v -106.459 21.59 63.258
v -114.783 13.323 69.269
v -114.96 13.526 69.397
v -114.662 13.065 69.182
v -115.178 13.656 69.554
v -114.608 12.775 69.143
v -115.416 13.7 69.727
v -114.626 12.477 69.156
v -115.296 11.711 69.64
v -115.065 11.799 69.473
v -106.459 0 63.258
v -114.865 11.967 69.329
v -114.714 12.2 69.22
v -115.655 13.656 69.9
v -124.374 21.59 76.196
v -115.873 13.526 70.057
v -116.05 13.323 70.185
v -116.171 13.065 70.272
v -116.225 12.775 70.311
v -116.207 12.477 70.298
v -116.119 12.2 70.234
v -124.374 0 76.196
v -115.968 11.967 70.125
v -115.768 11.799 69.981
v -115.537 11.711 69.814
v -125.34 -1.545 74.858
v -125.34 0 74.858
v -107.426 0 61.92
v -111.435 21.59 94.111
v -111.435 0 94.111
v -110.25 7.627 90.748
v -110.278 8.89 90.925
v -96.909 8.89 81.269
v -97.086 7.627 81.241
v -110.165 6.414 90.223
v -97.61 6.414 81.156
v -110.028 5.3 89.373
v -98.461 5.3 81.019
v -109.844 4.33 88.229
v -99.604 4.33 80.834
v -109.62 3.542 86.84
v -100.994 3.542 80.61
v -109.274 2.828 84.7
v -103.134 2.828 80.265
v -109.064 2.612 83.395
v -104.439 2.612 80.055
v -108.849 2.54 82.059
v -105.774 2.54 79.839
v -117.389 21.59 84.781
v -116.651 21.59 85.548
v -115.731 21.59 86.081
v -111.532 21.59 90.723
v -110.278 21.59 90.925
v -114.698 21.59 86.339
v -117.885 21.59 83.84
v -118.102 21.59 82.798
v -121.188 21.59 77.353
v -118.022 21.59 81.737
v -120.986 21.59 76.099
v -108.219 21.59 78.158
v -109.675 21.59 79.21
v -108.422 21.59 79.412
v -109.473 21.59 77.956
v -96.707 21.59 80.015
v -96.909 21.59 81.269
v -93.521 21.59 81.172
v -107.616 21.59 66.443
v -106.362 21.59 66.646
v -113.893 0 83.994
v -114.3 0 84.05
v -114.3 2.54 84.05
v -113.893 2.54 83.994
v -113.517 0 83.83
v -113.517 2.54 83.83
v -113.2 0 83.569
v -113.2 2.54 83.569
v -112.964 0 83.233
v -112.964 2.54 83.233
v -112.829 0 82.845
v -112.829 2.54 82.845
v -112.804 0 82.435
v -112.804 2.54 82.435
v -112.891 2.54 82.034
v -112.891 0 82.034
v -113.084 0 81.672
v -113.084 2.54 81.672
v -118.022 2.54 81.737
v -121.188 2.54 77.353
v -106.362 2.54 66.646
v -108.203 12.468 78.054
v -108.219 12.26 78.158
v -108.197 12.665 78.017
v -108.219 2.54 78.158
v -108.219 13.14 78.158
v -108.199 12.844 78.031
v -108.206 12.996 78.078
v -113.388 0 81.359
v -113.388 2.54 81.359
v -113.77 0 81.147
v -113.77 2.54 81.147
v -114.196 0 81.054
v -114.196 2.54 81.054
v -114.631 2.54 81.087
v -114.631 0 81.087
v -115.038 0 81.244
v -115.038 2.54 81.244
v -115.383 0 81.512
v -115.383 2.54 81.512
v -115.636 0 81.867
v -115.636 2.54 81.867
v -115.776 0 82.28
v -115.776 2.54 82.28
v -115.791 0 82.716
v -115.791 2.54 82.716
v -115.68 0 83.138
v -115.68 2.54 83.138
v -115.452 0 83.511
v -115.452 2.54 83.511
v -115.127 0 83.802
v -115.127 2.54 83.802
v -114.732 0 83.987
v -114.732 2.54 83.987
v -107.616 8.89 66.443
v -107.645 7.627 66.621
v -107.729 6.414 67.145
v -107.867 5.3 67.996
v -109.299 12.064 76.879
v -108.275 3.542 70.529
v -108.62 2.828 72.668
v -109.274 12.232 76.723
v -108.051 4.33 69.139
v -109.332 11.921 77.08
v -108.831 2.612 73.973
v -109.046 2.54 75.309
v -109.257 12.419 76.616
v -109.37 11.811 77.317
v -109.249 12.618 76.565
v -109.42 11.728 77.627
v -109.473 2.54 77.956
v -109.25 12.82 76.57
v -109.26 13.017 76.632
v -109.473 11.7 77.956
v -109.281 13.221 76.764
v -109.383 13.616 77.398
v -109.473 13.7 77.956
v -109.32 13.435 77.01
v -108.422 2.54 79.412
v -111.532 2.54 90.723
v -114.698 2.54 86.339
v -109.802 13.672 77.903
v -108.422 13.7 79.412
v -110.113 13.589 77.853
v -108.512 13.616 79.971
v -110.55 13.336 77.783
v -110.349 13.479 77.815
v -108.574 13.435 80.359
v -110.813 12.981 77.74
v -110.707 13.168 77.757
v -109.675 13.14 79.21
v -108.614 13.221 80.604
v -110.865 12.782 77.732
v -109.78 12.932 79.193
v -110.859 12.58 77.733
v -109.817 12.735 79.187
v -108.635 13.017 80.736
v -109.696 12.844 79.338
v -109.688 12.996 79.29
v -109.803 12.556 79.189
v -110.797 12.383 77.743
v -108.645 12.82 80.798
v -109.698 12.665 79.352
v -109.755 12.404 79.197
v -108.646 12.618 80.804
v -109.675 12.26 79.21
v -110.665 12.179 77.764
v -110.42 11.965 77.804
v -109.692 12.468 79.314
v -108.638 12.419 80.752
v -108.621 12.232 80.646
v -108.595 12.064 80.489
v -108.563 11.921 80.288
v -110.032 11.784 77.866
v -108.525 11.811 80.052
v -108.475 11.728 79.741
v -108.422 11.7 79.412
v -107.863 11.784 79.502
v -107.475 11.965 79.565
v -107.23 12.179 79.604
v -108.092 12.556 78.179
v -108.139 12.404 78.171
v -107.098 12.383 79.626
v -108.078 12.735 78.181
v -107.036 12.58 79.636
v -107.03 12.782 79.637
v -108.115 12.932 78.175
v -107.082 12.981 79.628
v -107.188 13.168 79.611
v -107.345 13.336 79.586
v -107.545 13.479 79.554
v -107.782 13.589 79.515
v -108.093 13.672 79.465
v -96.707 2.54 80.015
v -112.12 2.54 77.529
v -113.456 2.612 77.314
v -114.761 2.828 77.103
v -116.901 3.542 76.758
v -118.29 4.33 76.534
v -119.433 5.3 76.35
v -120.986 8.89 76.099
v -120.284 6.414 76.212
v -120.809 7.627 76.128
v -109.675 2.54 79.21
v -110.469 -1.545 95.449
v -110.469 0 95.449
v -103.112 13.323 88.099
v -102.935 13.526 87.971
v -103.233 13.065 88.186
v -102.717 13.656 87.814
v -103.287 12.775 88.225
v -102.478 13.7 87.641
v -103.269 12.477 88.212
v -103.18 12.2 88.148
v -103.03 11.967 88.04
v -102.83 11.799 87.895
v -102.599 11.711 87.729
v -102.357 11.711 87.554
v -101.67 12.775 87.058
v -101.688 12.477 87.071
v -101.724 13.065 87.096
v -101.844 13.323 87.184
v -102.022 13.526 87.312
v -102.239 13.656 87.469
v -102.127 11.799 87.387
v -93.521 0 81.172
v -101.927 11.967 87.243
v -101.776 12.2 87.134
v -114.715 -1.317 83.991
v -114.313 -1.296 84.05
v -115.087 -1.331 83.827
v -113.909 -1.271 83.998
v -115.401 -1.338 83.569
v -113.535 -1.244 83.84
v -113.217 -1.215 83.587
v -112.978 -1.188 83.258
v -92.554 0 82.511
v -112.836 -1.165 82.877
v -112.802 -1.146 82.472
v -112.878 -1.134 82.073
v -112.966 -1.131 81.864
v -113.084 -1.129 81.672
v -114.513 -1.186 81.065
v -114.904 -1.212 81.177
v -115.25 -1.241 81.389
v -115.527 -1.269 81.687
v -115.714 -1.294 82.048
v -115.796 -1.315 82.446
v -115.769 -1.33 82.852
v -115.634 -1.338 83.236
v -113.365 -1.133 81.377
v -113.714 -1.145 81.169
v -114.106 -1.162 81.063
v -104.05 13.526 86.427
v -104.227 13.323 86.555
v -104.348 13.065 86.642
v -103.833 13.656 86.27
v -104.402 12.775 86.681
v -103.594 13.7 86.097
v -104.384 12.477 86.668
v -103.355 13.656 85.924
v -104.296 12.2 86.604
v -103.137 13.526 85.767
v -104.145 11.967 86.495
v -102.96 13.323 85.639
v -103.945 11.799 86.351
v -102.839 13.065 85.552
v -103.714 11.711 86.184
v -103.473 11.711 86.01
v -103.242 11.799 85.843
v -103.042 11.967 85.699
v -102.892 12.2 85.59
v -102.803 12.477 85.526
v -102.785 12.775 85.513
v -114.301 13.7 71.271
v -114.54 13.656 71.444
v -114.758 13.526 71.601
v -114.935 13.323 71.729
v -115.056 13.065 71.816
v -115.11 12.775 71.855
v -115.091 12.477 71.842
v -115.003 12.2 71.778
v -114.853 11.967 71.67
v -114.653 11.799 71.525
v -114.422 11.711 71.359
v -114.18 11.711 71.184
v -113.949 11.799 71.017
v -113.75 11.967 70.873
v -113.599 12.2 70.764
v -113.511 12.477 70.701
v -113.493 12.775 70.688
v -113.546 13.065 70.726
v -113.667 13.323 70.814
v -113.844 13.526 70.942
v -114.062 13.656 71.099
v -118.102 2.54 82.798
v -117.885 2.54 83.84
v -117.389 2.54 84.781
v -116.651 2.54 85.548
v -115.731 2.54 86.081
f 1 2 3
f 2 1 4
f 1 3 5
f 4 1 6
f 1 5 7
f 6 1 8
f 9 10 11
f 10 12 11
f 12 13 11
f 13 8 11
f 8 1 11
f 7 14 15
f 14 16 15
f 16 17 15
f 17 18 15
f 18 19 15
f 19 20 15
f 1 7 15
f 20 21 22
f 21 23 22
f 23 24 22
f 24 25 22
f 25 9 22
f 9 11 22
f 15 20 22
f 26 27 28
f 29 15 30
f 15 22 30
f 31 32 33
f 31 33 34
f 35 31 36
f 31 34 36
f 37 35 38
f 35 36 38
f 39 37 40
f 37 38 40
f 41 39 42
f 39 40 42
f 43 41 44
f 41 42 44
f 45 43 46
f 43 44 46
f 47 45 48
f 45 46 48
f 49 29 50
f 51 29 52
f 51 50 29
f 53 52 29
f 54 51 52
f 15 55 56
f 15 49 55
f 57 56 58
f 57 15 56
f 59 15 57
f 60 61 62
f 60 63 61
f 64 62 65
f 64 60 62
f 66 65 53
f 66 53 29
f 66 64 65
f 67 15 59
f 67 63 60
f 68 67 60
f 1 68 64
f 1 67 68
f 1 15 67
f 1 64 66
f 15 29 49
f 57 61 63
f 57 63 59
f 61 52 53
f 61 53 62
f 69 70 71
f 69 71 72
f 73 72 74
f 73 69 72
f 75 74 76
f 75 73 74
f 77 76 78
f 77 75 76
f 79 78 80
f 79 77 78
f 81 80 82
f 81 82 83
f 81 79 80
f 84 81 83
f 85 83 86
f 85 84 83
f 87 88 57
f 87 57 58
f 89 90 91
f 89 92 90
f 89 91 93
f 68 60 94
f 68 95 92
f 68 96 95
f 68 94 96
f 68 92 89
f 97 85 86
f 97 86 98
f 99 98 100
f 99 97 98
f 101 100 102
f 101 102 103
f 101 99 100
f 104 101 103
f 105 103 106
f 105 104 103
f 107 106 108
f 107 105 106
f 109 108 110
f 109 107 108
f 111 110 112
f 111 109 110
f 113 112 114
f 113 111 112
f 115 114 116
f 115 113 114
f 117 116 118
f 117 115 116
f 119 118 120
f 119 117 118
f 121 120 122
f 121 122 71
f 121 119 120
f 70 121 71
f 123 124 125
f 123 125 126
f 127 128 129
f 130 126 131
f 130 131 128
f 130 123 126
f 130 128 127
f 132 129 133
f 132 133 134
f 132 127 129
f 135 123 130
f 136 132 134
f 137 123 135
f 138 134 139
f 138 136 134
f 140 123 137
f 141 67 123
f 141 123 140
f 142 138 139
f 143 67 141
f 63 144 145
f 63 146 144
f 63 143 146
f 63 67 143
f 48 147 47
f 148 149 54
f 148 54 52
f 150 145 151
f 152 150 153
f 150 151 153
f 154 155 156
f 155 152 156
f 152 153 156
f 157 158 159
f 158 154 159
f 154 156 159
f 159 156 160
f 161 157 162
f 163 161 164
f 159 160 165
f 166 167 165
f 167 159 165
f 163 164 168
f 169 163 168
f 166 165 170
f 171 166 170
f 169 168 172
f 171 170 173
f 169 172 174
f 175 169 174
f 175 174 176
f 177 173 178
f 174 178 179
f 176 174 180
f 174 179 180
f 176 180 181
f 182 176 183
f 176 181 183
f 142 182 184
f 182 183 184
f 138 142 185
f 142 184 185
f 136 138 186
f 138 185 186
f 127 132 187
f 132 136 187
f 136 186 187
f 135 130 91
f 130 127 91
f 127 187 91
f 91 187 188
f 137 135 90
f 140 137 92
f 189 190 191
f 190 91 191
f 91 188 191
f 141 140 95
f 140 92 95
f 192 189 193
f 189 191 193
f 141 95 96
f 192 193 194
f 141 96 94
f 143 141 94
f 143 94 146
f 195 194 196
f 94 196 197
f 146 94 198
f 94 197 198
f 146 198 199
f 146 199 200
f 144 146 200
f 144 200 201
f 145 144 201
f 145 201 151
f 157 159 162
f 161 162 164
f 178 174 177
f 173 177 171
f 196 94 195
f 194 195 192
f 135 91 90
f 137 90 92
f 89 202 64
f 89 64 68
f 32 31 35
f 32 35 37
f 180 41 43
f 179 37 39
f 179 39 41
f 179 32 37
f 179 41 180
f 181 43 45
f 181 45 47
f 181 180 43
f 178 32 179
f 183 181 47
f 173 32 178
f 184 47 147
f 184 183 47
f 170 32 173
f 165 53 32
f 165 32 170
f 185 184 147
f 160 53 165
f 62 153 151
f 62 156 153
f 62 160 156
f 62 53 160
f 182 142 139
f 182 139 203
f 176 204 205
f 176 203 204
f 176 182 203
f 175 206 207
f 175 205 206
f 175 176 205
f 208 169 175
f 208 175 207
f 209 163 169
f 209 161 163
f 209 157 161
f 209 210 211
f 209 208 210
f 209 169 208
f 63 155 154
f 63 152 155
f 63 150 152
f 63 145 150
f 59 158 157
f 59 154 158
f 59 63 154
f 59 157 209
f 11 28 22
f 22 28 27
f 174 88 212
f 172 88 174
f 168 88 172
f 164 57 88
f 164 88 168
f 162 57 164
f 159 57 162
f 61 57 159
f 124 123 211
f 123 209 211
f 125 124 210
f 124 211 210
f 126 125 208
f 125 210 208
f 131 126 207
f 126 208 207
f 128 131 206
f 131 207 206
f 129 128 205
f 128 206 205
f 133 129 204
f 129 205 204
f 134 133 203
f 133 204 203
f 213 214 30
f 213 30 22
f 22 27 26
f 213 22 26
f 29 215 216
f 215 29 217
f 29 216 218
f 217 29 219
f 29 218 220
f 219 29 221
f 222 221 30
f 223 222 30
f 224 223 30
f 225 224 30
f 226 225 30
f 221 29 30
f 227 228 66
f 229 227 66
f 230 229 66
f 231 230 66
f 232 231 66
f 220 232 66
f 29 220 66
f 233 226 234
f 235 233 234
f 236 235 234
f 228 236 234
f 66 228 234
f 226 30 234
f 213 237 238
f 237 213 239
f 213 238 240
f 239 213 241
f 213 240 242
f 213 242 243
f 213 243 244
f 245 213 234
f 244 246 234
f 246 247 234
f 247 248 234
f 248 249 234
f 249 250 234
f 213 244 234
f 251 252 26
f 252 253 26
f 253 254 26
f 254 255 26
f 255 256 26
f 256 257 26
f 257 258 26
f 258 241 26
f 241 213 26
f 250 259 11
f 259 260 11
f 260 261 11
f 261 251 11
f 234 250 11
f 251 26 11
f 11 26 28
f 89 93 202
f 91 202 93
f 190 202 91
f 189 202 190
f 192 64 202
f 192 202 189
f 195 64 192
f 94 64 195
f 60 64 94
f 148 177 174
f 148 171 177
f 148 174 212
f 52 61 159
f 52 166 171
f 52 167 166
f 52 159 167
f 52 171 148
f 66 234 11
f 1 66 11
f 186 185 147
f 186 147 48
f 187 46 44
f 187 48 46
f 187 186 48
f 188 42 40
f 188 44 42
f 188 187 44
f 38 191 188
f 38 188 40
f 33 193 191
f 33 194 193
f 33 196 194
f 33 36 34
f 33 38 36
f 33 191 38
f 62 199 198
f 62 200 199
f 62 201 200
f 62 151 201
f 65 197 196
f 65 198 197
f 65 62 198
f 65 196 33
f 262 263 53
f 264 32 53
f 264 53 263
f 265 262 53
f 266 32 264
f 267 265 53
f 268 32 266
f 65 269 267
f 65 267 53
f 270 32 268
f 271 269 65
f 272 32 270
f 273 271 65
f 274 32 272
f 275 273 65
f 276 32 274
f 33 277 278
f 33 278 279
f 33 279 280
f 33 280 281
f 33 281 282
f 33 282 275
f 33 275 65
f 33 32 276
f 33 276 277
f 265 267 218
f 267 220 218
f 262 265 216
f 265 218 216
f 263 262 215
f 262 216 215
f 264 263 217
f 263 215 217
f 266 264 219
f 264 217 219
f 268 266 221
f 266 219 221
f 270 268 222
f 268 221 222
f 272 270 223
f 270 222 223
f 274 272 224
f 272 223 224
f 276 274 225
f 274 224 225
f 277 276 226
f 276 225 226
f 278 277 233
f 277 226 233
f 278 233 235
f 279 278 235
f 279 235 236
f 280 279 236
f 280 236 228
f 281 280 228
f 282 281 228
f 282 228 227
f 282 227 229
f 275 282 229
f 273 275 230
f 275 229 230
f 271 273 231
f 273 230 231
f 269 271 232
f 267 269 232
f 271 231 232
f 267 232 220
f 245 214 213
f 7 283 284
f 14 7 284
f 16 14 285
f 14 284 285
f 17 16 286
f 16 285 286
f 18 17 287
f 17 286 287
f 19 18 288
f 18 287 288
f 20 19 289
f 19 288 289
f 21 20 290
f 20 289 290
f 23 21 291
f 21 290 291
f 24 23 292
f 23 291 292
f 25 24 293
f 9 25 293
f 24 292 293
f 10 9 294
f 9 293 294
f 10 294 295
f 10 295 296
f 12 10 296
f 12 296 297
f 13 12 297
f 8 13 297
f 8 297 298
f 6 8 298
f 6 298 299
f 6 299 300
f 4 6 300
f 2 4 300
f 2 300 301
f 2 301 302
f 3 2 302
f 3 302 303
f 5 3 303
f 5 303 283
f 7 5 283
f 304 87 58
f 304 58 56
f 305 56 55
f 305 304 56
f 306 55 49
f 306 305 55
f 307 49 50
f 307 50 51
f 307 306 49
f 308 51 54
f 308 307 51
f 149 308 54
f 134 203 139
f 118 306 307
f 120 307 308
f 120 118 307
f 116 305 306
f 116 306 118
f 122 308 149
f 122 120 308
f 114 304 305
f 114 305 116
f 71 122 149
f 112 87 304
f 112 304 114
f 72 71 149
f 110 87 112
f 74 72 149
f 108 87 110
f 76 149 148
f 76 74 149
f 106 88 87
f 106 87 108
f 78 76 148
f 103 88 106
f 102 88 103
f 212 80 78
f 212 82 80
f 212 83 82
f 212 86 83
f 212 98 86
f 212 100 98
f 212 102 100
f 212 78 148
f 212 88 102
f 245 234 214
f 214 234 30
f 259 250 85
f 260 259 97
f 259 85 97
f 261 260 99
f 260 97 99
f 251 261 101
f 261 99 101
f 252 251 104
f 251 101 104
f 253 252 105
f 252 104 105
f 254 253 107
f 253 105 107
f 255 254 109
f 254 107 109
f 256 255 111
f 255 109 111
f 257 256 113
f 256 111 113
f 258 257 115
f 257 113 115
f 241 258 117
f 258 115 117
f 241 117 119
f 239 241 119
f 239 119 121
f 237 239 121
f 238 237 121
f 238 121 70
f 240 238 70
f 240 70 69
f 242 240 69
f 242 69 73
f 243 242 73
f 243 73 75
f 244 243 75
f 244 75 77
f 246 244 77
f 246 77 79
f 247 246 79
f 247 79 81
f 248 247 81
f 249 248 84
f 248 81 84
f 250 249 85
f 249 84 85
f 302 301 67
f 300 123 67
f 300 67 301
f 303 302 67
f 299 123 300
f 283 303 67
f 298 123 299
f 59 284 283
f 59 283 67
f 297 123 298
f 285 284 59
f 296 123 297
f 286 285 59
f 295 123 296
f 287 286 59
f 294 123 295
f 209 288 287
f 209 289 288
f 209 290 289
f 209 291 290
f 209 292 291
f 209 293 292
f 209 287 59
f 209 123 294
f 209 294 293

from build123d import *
from build123d.topology import SkipClean

# Parameters (mm, degrees)
SKETCH1_R           = 1.5
BOSS_EXTRUDE2_DEPTH = 2.54
BOSS_EXTRUDE3_DEPTH = 19.05
BOSS_EXTRUDE6_DEPTH = 19.05
SKETCH4_R           = 1
CUT_EXTRUDE1_DEPTH  = 158.597711186
FILLET1_R           = 6.35
BOSS_EXTRUDE7_DEPTH = 12.7
SKETCH6_R           = 1.5
CUT_EXTRUDE2_DEPTH  = 159.693396714


with BuildPart() as part:
    # Sketch1 → Boss-Extrude2 (new body)
    with BuildSketch(Plane(origin=(0, 0, 0), x_dir=(1, 0, 0), z_dir=(0, 1, 0))):
        Polygon((-93.521103592, -81.172331094), (-106.459273851, -63.257941504), (-124.37366344, -76.196111763), (-111.435493182, -94.110501353), align=None)
        with Locations(Location((-114.3, -82.55, 0), (0, 0, 270))):
            Circle(SKETCH1_R, mode=Mode.SUBTRACT)
    extrude(amount=BOSS_EXTRUDE2_DEPTH)

    # Sketch2 → Boss-Extrude3 (add)
    with BuildSketch(Plane(origin=(0, 2.54, 0), x_dir=(1, 0, 0), z_dir=(0, 1, 0))):
        Polygon((-106.459273851, -63.257941504), (-124.37366344, -76.196111763), (-111.435493182, -94.110501353), (-93.521103592, -81.172331094), align=None)
        with BuildLine():
            Line((-106.888258276, -65.91764494), (-121.713960005, -76.625096188))
            Line((-121.713960005, -76.625096188), (-118.022197338, -81.736767574))
            ThreePointArc((-118.022197338, -81.736767574), (-117.38868786, -84.78071901), (-114.698271424, -86.339126532))
            Line((-114.698271424, -86.339126532), (-111.006508757, -91.450797917))
            Line((-111.006508757, -91.450797917), (-96.180807028, -80.743346669))
            Line((-96.180807028, -80.743346669), (-106.888258276, -65.91764494))
        make_face(mode=Mode.SUBTRACT)
    extrude(amount=BOSS_EXTRUDE3_DEPTH)

    # Sketch3 → Boss-Extrude6 (add)
    with BuildSketch(Plane(origin=(0, 21.59, 0), x_dir=(1, 0, 0), z_dir=(0, 1, 0))):
        Polygon((-121.713960005, -76.625096188), (-121.188174492, -77.353106899), (-109.675394227, -79.210006941), (-111.53229427, -90.722787207), (-111.006508757, -91.450797917), (-110.278498046, -90.925012404), (-108.421598003, -79.412232139), (-96.908817738, -81.269132182), (-96.180807028, -80.743346669), (-96.706592541, -80.015335958), (-108.219372806, -78.158435915), (-106.362472763, -66.64565565), (-106.888258276, -65.91764494), (-107.616268987, -66.443430453), (-109.473169029, -77.956210718), (-120.985949295, -76.099310675), align=None)
    extrude(amount=-BOSS_EXTRUDE6_DEPTH)

    # Sketch4 → Cut-Extrude1 (cut, through all)
    with BuildSketch(Plane(origin=(6.469085129, 0, 8.957194795), x_dir=(0.8106792283998809, 0, -0.5854905538443587), z_dir=(0.5854905538443586, 0, 0.8106792283998808))):
        with Locations(Location((-134.390249188, 12.7, 0), (0, 0, 90))):
            Circle(SKETCH4_R)
    extrude(amount=-CUT_EXTRUDE1_DEPTH, mode=Mode.SUBTRACT)

    # Fillet1
    fillet1_edges = [part.edges().sort_by_distance(p)[0] for p in [
        (-103.593657892, 2.54, 86.097072293),
        (-114.301109141, 2.54, 71.271370564),
    ]]
    fillet(fillet1_edges, radius=FILLET1_R)

    # Sketch5 → Boss-Extrude7 (add, symmetric)
    with BuildSketch(Plane(origin=(0, 0, 0), x_dir=(-0.8106792283998807, 0, 0.585490553844359), z_dir=(-0.5854905538443589, 0, -0.8106792283998806))):
        Polygon((123.341249188, 0), (145.439249188, 0), (145.439249188, -1.54524269), align=None)
    extrude(amount=BOSS_EXTRUDE7_DEPTH, both=True)

    # Sketch6 → Cut-Extrude2 (cut, through all)
    with SkipClean():  # the faces are left unmerged after this step: merging them gives an invalid solid
        with BuildSketch(Plane(origin=(0, 2.54, 0), x_dir=(1, 0, 0), z_dir=(0, 1, 0))):
            with Locations(Location((-114.3, -82.55, 0), (0, 0, 35.837652954))):
                Circle(SKETCH6_R)
        extrude(amount=-CUT_EXTRUDE2_DEPTH, mode=Mode.SUBTRACT)


solid = part.part
